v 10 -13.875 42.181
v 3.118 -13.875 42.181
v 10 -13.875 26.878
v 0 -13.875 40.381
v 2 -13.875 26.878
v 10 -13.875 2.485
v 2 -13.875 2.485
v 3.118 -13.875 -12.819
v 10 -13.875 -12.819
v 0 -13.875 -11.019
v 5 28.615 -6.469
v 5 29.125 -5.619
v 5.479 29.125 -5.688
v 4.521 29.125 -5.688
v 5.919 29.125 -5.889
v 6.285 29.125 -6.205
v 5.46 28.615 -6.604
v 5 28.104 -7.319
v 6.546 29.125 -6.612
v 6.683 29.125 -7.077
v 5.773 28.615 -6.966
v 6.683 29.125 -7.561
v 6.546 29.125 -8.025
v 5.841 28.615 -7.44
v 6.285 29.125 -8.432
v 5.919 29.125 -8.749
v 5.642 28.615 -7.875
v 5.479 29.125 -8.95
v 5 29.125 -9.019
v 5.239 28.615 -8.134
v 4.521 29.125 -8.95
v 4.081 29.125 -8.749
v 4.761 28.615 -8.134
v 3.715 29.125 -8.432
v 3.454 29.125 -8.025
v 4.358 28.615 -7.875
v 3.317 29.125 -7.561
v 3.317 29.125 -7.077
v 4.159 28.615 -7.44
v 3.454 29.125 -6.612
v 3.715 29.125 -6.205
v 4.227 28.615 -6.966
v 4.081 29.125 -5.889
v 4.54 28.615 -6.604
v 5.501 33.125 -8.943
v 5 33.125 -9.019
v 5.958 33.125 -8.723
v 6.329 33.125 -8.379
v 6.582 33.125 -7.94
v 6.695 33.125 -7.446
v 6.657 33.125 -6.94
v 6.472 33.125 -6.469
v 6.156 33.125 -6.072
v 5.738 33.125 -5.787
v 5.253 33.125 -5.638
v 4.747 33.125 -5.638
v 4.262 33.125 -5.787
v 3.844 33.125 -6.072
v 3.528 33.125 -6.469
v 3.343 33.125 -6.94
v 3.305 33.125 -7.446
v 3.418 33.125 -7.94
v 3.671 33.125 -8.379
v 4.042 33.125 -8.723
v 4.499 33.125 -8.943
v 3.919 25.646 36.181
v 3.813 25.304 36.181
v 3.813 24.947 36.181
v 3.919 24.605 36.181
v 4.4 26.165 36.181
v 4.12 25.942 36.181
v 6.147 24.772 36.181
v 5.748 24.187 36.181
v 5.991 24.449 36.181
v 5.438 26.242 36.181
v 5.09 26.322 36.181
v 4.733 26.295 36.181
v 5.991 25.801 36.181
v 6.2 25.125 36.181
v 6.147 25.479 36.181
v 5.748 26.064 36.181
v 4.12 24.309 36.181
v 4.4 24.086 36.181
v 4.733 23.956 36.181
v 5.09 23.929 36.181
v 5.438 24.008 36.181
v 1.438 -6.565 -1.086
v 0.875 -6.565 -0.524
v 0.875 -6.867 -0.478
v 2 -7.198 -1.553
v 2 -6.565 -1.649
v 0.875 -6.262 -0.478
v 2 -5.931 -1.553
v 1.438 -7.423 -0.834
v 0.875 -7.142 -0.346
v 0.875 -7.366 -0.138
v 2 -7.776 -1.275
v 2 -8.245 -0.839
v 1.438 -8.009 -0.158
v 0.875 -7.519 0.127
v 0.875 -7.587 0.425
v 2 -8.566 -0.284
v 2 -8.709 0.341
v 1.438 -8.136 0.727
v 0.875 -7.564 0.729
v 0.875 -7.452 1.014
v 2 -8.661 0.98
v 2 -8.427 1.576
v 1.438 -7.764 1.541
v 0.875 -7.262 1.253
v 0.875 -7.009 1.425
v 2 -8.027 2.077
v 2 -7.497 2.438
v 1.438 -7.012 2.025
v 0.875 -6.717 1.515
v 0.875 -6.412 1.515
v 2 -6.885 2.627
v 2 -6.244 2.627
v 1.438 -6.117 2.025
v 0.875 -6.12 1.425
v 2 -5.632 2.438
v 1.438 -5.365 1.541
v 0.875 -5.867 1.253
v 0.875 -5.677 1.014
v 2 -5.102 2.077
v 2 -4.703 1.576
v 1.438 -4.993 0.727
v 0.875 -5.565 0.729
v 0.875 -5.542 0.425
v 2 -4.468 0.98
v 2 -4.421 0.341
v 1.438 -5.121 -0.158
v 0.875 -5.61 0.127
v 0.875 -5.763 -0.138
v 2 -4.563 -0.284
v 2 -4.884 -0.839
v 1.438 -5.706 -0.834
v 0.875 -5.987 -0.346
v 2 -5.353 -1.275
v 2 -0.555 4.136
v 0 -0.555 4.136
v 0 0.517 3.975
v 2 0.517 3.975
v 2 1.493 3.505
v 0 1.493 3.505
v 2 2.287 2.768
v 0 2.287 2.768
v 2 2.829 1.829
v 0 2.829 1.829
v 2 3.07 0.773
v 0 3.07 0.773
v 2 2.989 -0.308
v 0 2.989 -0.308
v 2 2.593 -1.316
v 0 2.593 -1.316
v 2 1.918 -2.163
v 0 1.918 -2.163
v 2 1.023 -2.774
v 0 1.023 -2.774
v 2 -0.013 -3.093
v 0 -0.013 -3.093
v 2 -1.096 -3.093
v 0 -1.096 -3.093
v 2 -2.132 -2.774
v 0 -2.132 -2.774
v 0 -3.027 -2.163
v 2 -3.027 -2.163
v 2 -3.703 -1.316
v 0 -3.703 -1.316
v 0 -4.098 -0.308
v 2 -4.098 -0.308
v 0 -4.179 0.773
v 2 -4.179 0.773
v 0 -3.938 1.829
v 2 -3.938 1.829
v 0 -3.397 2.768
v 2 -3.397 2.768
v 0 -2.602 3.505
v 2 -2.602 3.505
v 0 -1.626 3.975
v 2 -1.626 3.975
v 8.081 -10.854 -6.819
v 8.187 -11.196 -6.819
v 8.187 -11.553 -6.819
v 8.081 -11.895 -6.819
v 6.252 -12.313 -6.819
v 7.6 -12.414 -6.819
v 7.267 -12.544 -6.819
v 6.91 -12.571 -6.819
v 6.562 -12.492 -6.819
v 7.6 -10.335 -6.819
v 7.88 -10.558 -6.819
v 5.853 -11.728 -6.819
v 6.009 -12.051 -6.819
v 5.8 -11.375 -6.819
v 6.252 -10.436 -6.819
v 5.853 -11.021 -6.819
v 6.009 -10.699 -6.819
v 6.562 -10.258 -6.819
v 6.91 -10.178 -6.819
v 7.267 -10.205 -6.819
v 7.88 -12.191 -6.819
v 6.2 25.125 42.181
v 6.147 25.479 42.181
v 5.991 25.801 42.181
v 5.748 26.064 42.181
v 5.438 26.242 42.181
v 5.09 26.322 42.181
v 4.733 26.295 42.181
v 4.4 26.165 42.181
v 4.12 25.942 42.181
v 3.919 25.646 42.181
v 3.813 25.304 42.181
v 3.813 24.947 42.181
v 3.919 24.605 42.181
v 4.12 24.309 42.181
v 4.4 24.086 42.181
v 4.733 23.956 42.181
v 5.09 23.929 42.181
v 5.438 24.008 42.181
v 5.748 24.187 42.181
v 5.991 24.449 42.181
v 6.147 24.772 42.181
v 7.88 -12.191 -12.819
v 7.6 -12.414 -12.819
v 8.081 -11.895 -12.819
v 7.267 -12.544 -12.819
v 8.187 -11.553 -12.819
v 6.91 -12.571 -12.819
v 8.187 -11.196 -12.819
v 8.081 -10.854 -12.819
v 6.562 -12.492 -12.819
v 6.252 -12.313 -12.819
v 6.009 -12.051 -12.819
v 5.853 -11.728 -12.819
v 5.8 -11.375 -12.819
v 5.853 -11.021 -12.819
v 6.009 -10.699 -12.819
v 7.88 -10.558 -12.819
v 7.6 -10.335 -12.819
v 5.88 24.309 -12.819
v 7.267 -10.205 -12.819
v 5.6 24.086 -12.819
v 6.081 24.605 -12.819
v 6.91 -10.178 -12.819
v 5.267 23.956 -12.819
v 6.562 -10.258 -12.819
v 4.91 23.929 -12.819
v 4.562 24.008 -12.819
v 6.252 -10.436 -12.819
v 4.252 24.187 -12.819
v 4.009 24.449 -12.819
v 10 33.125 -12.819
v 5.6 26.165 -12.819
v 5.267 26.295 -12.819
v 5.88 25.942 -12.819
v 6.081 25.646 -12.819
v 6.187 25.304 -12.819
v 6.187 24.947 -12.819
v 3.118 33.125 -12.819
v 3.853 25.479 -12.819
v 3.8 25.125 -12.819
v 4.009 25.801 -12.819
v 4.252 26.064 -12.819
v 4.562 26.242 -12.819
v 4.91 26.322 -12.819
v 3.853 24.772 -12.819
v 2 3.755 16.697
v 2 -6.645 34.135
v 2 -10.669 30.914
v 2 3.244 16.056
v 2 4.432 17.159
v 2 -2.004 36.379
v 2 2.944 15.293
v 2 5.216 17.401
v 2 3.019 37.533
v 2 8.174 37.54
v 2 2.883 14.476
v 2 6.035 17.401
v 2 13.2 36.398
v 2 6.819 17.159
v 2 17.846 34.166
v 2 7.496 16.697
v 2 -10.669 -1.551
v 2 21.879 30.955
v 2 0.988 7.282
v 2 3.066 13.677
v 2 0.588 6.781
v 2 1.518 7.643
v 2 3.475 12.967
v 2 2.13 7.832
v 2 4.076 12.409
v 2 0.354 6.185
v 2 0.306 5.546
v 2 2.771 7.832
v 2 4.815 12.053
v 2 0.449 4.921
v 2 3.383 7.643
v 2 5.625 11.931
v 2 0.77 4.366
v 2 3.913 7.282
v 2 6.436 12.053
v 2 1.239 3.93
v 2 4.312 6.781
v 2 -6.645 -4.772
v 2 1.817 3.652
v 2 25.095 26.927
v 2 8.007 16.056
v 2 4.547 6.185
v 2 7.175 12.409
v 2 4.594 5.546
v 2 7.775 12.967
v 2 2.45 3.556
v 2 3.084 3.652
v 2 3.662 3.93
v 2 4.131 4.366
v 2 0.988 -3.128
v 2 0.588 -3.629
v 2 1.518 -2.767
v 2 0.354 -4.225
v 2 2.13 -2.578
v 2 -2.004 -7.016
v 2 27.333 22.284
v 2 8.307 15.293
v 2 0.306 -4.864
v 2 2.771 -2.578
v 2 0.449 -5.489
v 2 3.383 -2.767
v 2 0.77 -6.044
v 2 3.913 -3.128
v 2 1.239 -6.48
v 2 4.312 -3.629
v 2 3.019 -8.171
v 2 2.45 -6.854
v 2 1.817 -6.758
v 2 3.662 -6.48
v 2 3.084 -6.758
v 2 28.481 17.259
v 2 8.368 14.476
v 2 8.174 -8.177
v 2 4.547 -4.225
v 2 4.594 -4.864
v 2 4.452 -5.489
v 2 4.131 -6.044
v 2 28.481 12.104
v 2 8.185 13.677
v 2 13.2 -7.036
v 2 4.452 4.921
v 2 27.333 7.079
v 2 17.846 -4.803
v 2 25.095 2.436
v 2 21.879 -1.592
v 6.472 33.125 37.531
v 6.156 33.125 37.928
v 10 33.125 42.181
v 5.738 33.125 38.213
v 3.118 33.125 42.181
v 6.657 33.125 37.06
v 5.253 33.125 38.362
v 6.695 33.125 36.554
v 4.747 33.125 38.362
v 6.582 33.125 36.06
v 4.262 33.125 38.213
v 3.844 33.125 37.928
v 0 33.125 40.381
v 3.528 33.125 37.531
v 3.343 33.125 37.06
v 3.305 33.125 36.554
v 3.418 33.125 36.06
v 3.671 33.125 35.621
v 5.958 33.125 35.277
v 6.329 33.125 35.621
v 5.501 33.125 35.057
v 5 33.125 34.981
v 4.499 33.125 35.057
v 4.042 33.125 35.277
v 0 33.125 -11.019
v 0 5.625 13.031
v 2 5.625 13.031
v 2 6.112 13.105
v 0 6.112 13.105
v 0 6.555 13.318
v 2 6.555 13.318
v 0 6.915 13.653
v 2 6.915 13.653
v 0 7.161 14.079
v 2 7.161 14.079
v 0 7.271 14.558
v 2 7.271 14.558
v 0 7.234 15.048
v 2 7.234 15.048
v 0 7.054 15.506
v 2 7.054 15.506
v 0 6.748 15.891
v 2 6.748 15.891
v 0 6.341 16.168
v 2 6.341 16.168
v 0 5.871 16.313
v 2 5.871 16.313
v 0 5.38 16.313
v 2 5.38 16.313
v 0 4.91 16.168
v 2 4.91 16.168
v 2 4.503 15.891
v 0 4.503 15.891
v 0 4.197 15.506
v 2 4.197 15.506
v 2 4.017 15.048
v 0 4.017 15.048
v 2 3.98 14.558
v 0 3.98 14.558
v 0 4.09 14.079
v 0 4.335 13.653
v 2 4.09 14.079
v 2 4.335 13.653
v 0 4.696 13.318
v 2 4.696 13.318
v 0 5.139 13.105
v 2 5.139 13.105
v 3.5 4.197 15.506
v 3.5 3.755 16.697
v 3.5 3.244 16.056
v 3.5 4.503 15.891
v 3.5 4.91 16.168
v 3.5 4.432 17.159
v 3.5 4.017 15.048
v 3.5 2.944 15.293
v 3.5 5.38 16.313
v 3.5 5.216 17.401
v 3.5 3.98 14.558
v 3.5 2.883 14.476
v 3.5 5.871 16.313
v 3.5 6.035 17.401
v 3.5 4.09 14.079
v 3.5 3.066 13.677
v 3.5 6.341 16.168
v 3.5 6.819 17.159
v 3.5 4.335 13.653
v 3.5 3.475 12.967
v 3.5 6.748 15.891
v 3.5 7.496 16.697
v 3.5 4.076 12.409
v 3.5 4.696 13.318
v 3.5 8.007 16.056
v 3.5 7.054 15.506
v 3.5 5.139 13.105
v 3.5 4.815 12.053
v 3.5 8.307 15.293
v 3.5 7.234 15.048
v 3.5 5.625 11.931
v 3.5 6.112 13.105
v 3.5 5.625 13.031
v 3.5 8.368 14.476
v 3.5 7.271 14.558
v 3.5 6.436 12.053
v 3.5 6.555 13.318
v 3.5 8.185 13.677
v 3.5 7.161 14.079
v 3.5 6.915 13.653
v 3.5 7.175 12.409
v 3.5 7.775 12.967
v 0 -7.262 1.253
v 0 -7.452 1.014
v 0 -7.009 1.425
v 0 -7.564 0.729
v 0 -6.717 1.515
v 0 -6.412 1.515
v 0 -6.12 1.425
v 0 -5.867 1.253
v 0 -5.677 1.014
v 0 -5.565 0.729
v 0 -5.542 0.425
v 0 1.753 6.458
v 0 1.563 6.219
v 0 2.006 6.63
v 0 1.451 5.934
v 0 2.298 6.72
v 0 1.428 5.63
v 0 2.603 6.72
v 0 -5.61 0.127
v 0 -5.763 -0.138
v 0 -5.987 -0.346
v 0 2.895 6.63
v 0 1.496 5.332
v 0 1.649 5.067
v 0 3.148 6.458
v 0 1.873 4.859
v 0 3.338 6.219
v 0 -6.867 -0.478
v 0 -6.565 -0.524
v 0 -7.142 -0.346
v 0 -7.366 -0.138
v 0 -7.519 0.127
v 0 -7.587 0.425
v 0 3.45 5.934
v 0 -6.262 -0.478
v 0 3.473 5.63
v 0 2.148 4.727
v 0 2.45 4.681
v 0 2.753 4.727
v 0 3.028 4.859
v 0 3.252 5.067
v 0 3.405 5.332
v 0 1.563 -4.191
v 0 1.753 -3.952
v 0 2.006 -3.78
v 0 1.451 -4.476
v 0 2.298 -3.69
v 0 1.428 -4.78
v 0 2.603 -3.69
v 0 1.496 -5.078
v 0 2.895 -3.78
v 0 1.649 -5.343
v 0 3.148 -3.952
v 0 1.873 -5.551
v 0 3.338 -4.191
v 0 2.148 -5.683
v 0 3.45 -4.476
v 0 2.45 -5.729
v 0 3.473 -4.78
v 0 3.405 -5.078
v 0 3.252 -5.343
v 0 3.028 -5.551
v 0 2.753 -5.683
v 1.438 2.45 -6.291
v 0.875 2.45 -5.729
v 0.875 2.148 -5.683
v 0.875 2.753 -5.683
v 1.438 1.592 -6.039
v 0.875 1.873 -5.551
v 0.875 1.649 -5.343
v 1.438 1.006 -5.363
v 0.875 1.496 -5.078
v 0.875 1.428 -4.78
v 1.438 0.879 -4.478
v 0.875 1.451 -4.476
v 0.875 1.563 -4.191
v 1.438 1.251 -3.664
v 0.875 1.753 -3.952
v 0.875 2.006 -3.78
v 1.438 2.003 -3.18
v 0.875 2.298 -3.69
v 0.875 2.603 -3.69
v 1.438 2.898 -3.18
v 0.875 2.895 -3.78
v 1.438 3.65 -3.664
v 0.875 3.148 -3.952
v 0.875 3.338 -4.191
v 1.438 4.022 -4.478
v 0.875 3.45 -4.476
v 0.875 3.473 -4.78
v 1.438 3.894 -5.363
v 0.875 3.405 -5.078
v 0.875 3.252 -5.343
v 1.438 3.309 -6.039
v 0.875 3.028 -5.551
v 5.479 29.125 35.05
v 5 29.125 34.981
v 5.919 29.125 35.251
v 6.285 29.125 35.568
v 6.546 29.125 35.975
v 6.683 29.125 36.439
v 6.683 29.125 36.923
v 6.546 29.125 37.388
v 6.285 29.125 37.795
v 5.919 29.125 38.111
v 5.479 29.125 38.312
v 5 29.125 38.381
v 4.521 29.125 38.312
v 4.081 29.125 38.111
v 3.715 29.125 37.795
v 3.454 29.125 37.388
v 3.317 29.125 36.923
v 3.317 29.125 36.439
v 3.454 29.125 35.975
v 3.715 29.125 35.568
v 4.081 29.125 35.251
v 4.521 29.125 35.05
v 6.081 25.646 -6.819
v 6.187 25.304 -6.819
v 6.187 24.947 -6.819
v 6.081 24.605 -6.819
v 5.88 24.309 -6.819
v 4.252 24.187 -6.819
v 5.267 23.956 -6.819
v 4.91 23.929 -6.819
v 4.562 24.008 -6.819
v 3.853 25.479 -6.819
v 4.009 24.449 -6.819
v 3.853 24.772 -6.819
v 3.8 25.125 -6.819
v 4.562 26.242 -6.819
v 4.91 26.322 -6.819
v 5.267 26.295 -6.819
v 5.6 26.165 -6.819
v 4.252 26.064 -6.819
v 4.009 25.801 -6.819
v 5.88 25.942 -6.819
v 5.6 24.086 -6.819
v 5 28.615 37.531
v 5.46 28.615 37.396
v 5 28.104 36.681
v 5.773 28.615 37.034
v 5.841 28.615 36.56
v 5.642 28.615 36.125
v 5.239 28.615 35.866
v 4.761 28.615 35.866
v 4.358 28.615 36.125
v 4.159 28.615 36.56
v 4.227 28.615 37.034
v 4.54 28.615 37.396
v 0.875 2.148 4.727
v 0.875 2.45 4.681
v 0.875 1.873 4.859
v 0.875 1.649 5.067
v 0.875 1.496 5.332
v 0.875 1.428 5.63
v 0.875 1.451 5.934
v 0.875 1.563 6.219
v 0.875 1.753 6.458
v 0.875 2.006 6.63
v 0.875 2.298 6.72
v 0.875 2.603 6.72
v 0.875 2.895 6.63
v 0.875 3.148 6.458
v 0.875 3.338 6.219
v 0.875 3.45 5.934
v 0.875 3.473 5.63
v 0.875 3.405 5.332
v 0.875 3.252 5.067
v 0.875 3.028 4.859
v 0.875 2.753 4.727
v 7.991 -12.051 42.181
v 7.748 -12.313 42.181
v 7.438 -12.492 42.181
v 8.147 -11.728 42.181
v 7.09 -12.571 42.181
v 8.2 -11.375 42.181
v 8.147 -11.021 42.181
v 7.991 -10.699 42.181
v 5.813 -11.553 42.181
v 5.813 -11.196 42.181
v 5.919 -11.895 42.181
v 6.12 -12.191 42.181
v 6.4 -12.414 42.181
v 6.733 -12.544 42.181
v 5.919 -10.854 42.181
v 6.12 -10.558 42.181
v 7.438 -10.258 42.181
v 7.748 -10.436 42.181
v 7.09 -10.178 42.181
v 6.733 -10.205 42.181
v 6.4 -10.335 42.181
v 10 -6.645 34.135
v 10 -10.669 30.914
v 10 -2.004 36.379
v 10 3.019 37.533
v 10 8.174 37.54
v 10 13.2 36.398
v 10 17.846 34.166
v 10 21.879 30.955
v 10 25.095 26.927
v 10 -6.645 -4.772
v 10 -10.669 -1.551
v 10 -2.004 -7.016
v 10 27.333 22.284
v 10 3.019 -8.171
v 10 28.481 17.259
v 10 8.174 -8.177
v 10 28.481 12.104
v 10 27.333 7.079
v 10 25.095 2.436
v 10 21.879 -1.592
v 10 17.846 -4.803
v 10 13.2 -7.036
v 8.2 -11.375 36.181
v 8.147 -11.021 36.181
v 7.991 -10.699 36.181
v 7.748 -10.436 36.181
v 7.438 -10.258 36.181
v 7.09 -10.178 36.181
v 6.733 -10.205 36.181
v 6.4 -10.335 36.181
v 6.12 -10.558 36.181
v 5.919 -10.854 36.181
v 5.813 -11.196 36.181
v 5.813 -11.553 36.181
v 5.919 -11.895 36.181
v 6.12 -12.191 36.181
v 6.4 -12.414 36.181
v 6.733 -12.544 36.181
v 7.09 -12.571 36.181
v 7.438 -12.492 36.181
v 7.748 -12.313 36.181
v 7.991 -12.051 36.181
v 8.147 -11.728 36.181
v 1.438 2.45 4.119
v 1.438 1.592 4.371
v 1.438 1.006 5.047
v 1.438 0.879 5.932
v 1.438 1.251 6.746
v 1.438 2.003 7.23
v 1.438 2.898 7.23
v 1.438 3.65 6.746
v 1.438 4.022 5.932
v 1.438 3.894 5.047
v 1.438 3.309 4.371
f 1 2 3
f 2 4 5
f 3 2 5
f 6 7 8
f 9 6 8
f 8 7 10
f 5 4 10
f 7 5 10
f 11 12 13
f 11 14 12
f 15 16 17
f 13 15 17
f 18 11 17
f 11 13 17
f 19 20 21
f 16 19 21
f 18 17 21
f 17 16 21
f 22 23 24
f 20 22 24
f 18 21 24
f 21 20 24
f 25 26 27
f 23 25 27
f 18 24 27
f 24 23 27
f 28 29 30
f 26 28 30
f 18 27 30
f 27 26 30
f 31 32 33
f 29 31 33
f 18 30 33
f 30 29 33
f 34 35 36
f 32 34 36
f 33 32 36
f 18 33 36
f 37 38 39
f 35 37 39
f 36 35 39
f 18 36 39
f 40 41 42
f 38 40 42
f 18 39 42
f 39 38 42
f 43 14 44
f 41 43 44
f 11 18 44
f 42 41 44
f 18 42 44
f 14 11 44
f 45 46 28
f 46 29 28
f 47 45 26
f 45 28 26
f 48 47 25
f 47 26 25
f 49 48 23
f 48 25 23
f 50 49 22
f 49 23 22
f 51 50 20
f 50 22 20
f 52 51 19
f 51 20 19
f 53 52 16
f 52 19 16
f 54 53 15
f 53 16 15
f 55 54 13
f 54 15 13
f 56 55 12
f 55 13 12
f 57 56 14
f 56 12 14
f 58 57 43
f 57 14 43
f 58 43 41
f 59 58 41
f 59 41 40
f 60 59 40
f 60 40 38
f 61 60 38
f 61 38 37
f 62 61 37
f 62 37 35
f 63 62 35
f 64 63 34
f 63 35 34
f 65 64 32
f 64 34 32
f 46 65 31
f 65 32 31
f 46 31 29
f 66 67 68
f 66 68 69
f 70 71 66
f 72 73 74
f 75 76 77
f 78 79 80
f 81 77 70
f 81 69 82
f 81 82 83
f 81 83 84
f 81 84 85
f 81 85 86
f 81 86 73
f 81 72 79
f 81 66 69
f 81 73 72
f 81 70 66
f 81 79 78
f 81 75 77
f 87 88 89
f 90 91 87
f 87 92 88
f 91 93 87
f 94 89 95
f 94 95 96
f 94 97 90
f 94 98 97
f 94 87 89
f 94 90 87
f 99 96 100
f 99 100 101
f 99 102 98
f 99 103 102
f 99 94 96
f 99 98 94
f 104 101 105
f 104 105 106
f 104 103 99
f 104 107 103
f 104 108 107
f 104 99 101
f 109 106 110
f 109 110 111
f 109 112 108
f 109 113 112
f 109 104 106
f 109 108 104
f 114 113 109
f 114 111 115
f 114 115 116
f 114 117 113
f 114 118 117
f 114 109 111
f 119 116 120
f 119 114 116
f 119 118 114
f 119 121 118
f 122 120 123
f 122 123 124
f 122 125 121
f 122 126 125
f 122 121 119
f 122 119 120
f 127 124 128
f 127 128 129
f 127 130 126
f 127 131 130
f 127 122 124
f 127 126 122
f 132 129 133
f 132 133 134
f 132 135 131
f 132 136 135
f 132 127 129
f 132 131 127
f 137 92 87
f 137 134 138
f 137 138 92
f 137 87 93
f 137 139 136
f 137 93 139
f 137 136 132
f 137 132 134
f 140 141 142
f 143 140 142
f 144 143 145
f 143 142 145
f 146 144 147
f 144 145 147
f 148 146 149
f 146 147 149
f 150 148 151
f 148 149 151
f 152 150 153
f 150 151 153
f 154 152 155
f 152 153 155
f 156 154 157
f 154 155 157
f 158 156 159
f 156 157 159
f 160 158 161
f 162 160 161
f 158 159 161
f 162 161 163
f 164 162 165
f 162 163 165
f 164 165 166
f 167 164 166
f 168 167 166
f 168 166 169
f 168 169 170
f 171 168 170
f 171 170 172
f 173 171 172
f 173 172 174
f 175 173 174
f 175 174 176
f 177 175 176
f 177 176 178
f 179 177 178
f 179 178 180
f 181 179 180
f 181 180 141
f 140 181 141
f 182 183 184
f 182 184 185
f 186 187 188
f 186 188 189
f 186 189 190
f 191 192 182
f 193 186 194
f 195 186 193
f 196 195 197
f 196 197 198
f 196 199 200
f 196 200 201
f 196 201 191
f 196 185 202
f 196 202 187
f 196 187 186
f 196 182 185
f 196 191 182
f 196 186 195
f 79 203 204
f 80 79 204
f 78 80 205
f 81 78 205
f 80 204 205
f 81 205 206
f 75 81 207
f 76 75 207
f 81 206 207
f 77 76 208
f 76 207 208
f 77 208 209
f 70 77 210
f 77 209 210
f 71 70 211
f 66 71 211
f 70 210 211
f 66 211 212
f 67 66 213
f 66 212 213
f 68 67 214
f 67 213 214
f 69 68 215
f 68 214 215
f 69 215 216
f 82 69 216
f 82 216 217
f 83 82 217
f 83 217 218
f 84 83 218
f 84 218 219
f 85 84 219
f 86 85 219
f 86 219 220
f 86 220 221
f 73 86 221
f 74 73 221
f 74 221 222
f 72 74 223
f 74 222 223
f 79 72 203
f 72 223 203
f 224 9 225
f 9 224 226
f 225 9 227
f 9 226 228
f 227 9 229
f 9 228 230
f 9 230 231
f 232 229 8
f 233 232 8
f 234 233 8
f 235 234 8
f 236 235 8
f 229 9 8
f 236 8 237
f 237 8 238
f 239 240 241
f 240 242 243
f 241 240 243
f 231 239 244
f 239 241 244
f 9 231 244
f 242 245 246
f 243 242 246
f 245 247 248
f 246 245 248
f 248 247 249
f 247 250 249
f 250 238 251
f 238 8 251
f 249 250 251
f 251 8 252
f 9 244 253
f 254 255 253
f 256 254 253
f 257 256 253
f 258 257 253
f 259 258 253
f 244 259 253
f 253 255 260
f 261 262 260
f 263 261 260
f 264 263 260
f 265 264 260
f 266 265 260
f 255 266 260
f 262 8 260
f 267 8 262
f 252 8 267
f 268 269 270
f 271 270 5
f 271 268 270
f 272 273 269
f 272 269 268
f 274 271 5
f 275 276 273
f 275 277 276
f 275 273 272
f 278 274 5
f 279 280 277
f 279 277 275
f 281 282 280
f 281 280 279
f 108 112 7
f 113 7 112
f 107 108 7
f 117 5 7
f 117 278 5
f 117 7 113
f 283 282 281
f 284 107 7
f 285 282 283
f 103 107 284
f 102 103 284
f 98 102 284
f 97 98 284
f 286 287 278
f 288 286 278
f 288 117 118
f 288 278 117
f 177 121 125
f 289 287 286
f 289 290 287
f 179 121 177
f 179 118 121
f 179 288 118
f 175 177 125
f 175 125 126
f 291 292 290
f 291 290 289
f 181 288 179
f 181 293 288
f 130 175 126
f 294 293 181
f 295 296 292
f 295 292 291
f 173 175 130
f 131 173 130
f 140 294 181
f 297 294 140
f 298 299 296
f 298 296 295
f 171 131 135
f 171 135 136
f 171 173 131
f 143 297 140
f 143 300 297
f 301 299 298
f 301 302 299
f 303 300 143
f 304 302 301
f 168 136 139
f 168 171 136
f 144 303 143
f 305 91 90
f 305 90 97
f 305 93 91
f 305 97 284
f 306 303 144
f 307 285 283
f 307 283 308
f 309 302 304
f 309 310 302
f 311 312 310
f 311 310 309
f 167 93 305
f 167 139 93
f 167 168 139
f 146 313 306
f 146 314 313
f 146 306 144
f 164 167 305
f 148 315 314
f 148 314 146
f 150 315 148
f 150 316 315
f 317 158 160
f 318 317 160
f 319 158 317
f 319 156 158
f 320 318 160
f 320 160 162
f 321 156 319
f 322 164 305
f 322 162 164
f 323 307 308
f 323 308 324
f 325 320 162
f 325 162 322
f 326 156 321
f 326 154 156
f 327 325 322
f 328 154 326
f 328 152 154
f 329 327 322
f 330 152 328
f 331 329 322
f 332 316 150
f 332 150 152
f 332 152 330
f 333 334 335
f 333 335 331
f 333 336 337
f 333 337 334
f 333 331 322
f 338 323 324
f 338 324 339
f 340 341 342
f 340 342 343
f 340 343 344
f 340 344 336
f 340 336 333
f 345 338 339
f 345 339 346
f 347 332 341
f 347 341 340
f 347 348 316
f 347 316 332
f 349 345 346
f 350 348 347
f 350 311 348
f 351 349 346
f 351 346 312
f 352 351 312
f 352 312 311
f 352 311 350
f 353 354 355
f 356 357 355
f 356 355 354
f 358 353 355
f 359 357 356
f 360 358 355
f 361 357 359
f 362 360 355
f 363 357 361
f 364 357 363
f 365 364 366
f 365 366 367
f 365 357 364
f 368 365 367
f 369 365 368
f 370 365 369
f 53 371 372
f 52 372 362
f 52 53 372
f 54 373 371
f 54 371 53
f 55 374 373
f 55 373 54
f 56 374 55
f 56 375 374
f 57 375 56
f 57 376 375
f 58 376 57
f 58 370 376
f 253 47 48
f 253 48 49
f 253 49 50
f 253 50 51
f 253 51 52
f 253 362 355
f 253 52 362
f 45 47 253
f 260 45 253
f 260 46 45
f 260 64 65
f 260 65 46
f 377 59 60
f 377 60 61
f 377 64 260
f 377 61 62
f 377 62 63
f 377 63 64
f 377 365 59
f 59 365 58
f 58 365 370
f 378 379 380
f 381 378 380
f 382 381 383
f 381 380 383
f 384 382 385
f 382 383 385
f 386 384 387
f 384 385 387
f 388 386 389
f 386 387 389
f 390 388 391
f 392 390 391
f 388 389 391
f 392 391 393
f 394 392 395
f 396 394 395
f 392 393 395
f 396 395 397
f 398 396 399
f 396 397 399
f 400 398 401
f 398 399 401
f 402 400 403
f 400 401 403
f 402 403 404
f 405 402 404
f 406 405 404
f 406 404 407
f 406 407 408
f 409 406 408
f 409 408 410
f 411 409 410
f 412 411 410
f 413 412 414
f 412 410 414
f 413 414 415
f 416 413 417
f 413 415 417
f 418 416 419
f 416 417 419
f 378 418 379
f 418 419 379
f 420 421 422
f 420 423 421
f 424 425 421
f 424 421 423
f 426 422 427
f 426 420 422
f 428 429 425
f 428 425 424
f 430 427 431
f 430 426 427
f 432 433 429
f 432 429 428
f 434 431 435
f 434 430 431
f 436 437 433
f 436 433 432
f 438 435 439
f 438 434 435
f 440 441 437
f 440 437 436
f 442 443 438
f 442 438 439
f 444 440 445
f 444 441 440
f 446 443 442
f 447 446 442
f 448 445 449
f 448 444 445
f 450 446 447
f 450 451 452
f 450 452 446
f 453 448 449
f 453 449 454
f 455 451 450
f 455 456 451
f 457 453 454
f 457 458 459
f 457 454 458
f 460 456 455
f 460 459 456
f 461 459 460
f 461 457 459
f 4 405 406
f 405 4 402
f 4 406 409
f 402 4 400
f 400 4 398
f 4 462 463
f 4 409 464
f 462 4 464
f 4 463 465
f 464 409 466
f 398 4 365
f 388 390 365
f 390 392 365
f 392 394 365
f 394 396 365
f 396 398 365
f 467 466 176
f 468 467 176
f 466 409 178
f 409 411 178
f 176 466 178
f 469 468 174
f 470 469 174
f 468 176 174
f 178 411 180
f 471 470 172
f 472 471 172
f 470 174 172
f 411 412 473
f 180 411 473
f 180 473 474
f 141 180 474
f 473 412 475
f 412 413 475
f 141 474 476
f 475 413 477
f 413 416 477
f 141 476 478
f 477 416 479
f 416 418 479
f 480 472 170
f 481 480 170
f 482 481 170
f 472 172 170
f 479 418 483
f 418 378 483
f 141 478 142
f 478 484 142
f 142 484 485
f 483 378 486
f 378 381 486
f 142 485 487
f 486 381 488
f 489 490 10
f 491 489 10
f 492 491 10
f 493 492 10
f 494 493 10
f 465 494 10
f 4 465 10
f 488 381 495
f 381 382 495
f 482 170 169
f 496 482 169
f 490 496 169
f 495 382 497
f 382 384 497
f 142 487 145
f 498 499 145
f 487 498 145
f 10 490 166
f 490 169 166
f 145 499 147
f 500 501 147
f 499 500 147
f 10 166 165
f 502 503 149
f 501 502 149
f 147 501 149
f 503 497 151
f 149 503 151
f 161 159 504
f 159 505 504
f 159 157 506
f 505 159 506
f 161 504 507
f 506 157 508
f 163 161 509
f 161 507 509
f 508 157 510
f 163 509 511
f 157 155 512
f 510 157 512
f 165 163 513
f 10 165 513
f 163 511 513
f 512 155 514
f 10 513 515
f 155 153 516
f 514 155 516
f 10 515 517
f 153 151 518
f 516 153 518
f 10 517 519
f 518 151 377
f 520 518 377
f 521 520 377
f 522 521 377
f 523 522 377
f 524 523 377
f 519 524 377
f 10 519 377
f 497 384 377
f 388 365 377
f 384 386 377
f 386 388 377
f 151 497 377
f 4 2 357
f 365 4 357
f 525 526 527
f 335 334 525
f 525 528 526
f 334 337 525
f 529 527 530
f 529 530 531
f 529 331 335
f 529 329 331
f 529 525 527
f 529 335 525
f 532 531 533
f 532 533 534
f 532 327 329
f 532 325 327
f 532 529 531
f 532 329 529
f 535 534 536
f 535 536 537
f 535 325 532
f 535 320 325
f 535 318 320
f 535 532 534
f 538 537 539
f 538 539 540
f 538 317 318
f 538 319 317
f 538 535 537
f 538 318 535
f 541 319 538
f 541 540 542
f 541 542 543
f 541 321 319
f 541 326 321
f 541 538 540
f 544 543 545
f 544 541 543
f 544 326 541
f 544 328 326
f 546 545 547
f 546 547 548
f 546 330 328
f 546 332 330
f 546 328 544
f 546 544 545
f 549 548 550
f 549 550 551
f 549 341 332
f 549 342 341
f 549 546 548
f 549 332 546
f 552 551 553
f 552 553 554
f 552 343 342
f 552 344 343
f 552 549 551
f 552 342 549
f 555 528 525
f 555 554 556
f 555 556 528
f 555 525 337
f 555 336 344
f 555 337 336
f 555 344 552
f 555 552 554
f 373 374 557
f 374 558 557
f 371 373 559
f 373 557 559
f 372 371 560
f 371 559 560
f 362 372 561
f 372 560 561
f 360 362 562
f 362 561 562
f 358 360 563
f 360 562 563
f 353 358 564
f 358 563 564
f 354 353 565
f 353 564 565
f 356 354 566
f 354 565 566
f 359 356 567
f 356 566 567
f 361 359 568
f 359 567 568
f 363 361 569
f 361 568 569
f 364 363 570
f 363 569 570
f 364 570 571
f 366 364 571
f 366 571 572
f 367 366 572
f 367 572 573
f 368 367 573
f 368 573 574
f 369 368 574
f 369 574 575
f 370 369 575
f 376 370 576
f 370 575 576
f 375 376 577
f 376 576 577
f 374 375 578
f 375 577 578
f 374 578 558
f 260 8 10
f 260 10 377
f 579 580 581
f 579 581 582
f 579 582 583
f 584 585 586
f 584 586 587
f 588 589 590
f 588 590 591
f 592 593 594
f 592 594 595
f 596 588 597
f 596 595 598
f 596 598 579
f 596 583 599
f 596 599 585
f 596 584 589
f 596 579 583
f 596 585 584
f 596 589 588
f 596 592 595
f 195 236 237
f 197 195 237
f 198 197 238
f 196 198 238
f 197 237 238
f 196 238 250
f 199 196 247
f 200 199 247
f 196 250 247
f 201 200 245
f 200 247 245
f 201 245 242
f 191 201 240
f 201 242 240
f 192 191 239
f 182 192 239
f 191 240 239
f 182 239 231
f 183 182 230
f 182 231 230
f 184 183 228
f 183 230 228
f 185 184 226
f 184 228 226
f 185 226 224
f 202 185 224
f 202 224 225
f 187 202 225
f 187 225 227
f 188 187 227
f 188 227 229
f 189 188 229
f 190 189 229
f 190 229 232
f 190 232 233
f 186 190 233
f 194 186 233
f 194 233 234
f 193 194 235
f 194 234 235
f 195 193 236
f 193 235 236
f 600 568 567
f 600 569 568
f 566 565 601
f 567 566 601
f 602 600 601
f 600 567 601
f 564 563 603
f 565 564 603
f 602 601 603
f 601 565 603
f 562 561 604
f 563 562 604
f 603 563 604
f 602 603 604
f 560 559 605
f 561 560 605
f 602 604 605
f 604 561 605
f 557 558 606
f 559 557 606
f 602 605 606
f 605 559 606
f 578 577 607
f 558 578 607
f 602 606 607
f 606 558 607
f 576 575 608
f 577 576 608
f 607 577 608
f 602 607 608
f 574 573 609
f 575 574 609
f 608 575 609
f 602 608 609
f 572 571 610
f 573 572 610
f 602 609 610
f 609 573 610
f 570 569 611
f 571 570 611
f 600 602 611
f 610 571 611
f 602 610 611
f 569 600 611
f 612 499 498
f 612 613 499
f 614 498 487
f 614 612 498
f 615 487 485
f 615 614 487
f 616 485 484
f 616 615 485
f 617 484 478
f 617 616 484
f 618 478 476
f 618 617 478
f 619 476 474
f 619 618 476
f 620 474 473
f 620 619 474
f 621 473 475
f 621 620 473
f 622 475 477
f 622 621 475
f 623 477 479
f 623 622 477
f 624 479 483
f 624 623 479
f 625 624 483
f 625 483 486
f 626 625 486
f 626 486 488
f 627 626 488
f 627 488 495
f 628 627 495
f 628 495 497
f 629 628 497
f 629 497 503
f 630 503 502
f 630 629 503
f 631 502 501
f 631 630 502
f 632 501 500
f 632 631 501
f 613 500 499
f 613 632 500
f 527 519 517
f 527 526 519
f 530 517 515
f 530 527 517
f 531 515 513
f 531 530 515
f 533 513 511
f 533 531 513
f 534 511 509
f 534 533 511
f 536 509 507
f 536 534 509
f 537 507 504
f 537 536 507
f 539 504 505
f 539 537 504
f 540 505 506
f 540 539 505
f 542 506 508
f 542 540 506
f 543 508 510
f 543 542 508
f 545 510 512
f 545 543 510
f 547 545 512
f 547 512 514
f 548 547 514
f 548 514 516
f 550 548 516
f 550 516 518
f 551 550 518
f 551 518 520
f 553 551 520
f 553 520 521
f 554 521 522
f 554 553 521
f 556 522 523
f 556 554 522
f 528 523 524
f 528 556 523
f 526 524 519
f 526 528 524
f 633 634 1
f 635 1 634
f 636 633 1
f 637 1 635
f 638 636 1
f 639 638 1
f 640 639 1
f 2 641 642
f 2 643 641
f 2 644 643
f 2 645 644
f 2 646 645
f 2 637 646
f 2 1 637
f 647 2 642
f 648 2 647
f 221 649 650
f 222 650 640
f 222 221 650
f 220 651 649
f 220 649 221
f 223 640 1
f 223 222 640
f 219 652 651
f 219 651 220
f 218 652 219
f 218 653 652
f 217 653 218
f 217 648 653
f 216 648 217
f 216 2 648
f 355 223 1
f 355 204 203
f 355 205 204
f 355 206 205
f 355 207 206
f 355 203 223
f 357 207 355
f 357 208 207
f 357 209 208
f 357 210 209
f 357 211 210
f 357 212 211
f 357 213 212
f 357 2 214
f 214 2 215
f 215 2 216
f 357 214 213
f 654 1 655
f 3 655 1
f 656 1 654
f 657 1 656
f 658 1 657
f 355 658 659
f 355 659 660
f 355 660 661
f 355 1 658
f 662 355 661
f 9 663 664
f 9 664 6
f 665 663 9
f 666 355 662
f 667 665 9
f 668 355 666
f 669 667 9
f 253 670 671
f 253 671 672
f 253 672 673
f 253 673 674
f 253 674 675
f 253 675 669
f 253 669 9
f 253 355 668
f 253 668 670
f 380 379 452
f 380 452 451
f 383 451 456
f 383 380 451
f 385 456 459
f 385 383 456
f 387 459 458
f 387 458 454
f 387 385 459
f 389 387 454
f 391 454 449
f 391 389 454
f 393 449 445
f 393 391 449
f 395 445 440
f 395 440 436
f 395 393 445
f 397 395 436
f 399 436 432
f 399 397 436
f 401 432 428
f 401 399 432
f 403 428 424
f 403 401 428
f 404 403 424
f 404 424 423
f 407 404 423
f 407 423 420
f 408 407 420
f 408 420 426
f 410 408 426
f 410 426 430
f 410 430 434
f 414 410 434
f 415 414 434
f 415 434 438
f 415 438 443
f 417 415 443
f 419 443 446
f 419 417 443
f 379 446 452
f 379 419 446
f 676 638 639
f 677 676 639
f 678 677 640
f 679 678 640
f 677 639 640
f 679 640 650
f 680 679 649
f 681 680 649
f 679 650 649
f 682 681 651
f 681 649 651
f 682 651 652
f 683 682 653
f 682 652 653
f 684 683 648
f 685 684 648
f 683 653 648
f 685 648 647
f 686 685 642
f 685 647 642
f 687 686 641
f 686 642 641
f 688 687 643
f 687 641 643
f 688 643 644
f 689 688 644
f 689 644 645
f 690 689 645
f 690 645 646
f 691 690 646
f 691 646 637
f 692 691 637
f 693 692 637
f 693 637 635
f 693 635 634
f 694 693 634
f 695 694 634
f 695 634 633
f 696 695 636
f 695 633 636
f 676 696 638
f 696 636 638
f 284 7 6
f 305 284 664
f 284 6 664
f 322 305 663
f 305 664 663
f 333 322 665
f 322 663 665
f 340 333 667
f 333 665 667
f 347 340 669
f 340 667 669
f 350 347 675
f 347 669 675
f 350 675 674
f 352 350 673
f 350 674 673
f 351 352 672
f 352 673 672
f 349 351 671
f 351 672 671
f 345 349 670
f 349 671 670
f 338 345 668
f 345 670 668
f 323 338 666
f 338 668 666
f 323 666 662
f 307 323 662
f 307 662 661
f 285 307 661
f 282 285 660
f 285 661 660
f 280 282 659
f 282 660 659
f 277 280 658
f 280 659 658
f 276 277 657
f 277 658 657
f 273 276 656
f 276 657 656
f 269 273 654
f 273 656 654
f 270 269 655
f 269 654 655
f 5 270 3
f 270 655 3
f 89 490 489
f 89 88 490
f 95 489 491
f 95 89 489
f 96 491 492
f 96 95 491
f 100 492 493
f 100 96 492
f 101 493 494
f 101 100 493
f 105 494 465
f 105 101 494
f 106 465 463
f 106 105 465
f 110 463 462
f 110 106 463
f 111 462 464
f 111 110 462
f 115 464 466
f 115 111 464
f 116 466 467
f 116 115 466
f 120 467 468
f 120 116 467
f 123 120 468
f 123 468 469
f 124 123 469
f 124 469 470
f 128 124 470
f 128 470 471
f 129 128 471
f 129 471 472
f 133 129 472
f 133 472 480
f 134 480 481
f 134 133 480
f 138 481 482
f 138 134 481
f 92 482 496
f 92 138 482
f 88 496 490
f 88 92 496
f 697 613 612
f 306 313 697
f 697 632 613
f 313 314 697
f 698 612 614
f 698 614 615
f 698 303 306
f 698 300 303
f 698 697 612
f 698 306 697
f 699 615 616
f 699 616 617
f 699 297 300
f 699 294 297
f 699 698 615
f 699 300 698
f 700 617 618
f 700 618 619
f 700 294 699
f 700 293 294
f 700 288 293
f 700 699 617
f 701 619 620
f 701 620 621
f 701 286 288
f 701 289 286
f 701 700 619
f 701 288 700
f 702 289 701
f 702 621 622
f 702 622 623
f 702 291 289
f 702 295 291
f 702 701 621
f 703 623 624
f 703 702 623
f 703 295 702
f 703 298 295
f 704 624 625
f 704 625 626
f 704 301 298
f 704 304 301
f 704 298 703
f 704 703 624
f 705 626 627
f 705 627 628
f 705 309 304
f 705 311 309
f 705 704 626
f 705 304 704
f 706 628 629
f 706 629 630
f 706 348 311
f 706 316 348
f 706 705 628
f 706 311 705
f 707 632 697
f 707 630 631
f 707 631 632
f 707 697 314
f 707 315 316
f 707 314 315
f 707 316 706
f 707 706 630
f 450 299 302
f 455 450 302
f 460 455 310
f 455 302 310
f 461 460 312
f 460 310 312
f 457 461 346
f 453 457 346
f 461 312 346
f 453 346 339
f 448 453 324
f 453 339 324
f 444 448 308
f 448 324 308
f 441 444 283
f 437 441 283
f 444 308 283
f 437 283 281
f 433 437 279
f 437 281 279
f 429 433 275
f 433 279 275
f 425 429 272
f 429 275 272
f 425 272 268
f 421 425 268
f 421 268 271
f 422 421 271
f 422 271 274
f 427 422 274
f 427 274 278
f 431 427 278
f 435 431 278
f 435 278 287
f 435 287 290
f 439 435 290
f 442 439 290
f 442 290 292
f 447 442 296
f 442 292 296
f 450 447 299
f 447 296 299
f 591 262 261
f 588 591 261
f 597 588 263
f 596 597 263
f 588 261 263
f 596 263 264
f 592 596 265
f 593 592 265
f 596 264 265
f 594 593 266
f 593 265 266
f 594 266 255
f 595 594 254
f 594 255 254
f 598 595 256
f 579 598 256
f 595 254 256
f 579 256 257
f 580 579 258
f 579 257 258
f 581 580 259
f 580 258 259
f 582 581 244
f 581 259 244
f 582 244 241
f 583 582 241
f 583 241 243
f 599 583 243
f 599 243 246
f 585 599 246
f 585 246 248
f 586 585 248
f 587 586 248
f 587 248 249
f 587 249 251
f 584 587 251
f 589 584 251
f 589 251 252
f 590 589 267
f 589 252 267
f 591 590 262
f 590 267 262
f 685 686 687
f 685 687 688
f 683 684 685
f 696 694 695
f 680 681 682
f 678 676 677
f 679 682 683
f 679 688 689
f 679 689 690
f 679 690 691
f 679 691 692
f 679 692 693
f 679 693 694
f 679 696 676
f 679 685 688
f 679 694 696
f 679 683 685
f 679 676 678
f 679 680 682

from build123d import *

# Parameters (mm, degrees)
SKETCH1_W                                    = 55
SKETCH1_H                                    = 47
EXTRUDE1_DEPTH                               = 10
SKETCH2_R                                    = 23
EXTRUDE2_DEPTH                               = 8
SKETCH3_R                                    = 1.2
EXTRUDE3_DEPTH                               = 6
SKETCH4_R                                    = 1.2
EXTRUDE4_DEPTH                               = 6
SKETCH5_R                                    = 2.75
SKETCH5_R_2                                  = 1.65
EXTRUDE5_DEPTH                               = 1.5
SKETCH6_R                                    = 1.65
EXTRUDE6_DEPTH                               = 2
SKETCH7_R                                    = 3.635
EXTRUDE7_DEPTH                               = 3
CSK_FOR_M1_6_COUNTERSUNK_FLAT_HEAD_S_2_COUNT = 2
CSK_FOR_M1_6_COUNTERSUNK_FLAT_HEAD_S_2_PITCH = 10.41
CSK_FOR_M1_6_COUNTERSUNK_FLAT_HEAD_S_3_COUNT = 2
CSK_FOR_M1_6_COUNTERSUNK_FLAT_HEAD_S_3_PITCH = 10.409719016
CHAMFER1_SIZE                                = 1.8
CHAMFER1_SIZE2                               = 3.117691454
F_3_4_3_4_DIAMETER_HOLE1_D                   = 3.4
F_3_4_3_4_DIAMETER_HOLE1_DEPTH               = 4
F_3_4_3_4_DIAMETER_HOLE1_TIP                 = 1.021463052


with BuildPart() as part:
    # Sketch1 → Extrude1 (new body)
    with BuildSketch(Plane(origin=(0, 0, 0), x_dir=(0, 0, -1), z_dir=(1, 0, 0))):
        with Locations((-14.681315866, 9.625451264)):
            Rectangle(SKETCH1_W, SKETCH1_H)
    extrude(amount=EXTRUDE1_DEPTH)

    # Sketch2 → Extrude2 (cut)
    with BuildSketch(Plane(origin=(10, 0, 0), x_dir=(0, 0, -1), z_dir=(1, 0, 0))):
        with Locations((-14.681315866, 5.625451264)):
            Circle(SKETCH2_R)
    extrude(amount=-EXTRUDE2_DEPTH, mode=Mode.SUBTRACT)

    # Sketch3 → Extrude3 (cut)
    with BuildSketch(Plane.XY.offset(42.181315866)):
        with Locations((5, 25.125451264)):
            Circle(SKETCH3_R)
        with Locations((7, -11.374548736)):
            Circle(SKETCH3_R)
    extrude(amount=-EXTRUDE3_DEPTH, mode=Mode.SUBTRACT)

    # Sketch4 → Extrude4 (cut)
    with BuildSketch(Plane(origin=(0, 0, -12.818684134), x_dir=(-1, 0, 0), z_dir=(0, 0, -1))):
        with Locations((-5, 25.125451264)):
            Circle(SKETCH4_R)
        with Locations((-7, -11.374548736)):
            Circle(SKETCH4_R)
    extrude(amount=-EXTRUDE4_DEPTH, mode=Mode.SUBTRACT)

    # Sketch5 → Extrude5 (add)
    with BuildSketch(Plane(origin=(2, 0, 0), x_dir=(0, 0, -1), z_dir=(1, 0, 0))):
        with Locations((-14.681315866, 5.625451264)):
            Circle(SKETCH5_R)
        with Locations((-14.681315866, 5.625451264)):
            Circle(SKETCH5_R_2, mode=Mode.SUBTRACT)
    extrude(amount=EXTRUDE5_DEPTH)

    # Sketch6 → Extrude6 (cut)
    with BuildSketch(Plane(origin=(2, 0, 0), x_dir=(0, 0, -1), z_dir=(1, 0, 0))):
        with Locations((-14.681315866, 5.625451264)):
            Circle(SKETCH6_R)
    extrude(amount=-EXTRUDE6_DEPTH, mode=Mode.SUBTRACT)

    # Sketch7 → Extrude7 (cut)
    with BuildSketch(Plane.ZY):
        with Locations((0.501315866, -0.554548736)):
            Circle(SKETCH7_R)
    extrude(amount=-EXTRUDE7_DEPTH, mode=Mode.SUBTRACT)

    # Sketch10 → CSK for M1.6 Countersunk Flat Head Screw1 (revolve, cut)
    with BuildSketch(Plane(origin=(2, 2.450451264, 5.706315866), x_dir=(0, 0, -1), z_dir=(0, 1, 0))):
        Polygon((0, 0), (0, 2), (1.025, 2), (1.025, 1.125), (2.15, 0), align=None)
    csk_for_m1_6_countersunk_flat_head_screw = revolve(axis=Axis((8.35, 2.450451264, 5.706315866), (-1, 0, 0)), mode=Mode.SUBTRACT)

    # CSK for M1.6 Countersunk Flat Head S 2: CSK for M1.6 Countersunk Flat Head Screw1 ×2
    with Locations(*[(0, 0, -i * CSK_FOR_M1_6_COUNTERSUNK_FLAT_HEAD_S_2_PITCH) for i in range(1, CSK_FOR_M1_6_COUNTERSUNK_FLAT_HEAD_S_2_COUNT)]):
        add(csk_for_m1_6_countersunk_flat_head_screw, mode=Mode.SUBTRACT)

    # CSK for M1.6 Countersunk Flat Head S 3: CSK for M1.6 Countersunk Flat Head Screw1 ×2
    with Locations(*[Vector(0, -0.866017612, -0.500013496) * (i * CSK_FOR_M1_6_COUNTERSUNK_FLAT_HEAD_S_3_PITCH) for i in range(1, CSK_FOR_M1_6_COUNTERSUNK_FLAT_HEAD_S_3_COUNT)]):
        add(csk_for_m1_6_countersunk_flat_head_screw, mode=Mode.SUBTRACT)

    # Chamfer1
    chamfer1_edges = [part.edges().sort_by_distance(p)[0] for p in [
        (0, 9.625451264, -12.818684134),
        (0, 9.625451264, 42.181315866),
    ]]
    chamfer1_side = [part.faces().sort_by_distance(p)[0] for p in [
        (0, 9.84627635, 14.970036249),
    ]]
    chamfer(chamfer1_edges, length=CHAMFER1_SIZE, length2=CHAMFER1_SIZE2, reference=chamfer1_side[0])

    # Ø3.4 (3.4) Diameter Hole1
    with Locations(Plane(origin=(5, 33.125451264, -7.318684134), x_dir=(0, 0, 1), z_dir=(0, 1, 0))):
        with Locations((0, 0), (44, 0)):
            Hole(F_3_4_3_4_DIAMETER_HOLE1_D / 2, depth=F_3_4_3_4_DIAMETER_HOLE1_DEPTH)
            with Locations((0, 0, -(F_3_4_3_4_DIAMETER_HOLE1_DEPTH + F_3_4_3_4_DIAMETER_HOLE1_TIP / 2))):  # 118° drill point
                Cone(0, F_3_4_3_4_DIAMETER_HOLE1_D / 2, F_3_4_3_4_DIAMETER_HOLE1_TIP, mode=Mode.SUBTRACT)


solid = part.part
